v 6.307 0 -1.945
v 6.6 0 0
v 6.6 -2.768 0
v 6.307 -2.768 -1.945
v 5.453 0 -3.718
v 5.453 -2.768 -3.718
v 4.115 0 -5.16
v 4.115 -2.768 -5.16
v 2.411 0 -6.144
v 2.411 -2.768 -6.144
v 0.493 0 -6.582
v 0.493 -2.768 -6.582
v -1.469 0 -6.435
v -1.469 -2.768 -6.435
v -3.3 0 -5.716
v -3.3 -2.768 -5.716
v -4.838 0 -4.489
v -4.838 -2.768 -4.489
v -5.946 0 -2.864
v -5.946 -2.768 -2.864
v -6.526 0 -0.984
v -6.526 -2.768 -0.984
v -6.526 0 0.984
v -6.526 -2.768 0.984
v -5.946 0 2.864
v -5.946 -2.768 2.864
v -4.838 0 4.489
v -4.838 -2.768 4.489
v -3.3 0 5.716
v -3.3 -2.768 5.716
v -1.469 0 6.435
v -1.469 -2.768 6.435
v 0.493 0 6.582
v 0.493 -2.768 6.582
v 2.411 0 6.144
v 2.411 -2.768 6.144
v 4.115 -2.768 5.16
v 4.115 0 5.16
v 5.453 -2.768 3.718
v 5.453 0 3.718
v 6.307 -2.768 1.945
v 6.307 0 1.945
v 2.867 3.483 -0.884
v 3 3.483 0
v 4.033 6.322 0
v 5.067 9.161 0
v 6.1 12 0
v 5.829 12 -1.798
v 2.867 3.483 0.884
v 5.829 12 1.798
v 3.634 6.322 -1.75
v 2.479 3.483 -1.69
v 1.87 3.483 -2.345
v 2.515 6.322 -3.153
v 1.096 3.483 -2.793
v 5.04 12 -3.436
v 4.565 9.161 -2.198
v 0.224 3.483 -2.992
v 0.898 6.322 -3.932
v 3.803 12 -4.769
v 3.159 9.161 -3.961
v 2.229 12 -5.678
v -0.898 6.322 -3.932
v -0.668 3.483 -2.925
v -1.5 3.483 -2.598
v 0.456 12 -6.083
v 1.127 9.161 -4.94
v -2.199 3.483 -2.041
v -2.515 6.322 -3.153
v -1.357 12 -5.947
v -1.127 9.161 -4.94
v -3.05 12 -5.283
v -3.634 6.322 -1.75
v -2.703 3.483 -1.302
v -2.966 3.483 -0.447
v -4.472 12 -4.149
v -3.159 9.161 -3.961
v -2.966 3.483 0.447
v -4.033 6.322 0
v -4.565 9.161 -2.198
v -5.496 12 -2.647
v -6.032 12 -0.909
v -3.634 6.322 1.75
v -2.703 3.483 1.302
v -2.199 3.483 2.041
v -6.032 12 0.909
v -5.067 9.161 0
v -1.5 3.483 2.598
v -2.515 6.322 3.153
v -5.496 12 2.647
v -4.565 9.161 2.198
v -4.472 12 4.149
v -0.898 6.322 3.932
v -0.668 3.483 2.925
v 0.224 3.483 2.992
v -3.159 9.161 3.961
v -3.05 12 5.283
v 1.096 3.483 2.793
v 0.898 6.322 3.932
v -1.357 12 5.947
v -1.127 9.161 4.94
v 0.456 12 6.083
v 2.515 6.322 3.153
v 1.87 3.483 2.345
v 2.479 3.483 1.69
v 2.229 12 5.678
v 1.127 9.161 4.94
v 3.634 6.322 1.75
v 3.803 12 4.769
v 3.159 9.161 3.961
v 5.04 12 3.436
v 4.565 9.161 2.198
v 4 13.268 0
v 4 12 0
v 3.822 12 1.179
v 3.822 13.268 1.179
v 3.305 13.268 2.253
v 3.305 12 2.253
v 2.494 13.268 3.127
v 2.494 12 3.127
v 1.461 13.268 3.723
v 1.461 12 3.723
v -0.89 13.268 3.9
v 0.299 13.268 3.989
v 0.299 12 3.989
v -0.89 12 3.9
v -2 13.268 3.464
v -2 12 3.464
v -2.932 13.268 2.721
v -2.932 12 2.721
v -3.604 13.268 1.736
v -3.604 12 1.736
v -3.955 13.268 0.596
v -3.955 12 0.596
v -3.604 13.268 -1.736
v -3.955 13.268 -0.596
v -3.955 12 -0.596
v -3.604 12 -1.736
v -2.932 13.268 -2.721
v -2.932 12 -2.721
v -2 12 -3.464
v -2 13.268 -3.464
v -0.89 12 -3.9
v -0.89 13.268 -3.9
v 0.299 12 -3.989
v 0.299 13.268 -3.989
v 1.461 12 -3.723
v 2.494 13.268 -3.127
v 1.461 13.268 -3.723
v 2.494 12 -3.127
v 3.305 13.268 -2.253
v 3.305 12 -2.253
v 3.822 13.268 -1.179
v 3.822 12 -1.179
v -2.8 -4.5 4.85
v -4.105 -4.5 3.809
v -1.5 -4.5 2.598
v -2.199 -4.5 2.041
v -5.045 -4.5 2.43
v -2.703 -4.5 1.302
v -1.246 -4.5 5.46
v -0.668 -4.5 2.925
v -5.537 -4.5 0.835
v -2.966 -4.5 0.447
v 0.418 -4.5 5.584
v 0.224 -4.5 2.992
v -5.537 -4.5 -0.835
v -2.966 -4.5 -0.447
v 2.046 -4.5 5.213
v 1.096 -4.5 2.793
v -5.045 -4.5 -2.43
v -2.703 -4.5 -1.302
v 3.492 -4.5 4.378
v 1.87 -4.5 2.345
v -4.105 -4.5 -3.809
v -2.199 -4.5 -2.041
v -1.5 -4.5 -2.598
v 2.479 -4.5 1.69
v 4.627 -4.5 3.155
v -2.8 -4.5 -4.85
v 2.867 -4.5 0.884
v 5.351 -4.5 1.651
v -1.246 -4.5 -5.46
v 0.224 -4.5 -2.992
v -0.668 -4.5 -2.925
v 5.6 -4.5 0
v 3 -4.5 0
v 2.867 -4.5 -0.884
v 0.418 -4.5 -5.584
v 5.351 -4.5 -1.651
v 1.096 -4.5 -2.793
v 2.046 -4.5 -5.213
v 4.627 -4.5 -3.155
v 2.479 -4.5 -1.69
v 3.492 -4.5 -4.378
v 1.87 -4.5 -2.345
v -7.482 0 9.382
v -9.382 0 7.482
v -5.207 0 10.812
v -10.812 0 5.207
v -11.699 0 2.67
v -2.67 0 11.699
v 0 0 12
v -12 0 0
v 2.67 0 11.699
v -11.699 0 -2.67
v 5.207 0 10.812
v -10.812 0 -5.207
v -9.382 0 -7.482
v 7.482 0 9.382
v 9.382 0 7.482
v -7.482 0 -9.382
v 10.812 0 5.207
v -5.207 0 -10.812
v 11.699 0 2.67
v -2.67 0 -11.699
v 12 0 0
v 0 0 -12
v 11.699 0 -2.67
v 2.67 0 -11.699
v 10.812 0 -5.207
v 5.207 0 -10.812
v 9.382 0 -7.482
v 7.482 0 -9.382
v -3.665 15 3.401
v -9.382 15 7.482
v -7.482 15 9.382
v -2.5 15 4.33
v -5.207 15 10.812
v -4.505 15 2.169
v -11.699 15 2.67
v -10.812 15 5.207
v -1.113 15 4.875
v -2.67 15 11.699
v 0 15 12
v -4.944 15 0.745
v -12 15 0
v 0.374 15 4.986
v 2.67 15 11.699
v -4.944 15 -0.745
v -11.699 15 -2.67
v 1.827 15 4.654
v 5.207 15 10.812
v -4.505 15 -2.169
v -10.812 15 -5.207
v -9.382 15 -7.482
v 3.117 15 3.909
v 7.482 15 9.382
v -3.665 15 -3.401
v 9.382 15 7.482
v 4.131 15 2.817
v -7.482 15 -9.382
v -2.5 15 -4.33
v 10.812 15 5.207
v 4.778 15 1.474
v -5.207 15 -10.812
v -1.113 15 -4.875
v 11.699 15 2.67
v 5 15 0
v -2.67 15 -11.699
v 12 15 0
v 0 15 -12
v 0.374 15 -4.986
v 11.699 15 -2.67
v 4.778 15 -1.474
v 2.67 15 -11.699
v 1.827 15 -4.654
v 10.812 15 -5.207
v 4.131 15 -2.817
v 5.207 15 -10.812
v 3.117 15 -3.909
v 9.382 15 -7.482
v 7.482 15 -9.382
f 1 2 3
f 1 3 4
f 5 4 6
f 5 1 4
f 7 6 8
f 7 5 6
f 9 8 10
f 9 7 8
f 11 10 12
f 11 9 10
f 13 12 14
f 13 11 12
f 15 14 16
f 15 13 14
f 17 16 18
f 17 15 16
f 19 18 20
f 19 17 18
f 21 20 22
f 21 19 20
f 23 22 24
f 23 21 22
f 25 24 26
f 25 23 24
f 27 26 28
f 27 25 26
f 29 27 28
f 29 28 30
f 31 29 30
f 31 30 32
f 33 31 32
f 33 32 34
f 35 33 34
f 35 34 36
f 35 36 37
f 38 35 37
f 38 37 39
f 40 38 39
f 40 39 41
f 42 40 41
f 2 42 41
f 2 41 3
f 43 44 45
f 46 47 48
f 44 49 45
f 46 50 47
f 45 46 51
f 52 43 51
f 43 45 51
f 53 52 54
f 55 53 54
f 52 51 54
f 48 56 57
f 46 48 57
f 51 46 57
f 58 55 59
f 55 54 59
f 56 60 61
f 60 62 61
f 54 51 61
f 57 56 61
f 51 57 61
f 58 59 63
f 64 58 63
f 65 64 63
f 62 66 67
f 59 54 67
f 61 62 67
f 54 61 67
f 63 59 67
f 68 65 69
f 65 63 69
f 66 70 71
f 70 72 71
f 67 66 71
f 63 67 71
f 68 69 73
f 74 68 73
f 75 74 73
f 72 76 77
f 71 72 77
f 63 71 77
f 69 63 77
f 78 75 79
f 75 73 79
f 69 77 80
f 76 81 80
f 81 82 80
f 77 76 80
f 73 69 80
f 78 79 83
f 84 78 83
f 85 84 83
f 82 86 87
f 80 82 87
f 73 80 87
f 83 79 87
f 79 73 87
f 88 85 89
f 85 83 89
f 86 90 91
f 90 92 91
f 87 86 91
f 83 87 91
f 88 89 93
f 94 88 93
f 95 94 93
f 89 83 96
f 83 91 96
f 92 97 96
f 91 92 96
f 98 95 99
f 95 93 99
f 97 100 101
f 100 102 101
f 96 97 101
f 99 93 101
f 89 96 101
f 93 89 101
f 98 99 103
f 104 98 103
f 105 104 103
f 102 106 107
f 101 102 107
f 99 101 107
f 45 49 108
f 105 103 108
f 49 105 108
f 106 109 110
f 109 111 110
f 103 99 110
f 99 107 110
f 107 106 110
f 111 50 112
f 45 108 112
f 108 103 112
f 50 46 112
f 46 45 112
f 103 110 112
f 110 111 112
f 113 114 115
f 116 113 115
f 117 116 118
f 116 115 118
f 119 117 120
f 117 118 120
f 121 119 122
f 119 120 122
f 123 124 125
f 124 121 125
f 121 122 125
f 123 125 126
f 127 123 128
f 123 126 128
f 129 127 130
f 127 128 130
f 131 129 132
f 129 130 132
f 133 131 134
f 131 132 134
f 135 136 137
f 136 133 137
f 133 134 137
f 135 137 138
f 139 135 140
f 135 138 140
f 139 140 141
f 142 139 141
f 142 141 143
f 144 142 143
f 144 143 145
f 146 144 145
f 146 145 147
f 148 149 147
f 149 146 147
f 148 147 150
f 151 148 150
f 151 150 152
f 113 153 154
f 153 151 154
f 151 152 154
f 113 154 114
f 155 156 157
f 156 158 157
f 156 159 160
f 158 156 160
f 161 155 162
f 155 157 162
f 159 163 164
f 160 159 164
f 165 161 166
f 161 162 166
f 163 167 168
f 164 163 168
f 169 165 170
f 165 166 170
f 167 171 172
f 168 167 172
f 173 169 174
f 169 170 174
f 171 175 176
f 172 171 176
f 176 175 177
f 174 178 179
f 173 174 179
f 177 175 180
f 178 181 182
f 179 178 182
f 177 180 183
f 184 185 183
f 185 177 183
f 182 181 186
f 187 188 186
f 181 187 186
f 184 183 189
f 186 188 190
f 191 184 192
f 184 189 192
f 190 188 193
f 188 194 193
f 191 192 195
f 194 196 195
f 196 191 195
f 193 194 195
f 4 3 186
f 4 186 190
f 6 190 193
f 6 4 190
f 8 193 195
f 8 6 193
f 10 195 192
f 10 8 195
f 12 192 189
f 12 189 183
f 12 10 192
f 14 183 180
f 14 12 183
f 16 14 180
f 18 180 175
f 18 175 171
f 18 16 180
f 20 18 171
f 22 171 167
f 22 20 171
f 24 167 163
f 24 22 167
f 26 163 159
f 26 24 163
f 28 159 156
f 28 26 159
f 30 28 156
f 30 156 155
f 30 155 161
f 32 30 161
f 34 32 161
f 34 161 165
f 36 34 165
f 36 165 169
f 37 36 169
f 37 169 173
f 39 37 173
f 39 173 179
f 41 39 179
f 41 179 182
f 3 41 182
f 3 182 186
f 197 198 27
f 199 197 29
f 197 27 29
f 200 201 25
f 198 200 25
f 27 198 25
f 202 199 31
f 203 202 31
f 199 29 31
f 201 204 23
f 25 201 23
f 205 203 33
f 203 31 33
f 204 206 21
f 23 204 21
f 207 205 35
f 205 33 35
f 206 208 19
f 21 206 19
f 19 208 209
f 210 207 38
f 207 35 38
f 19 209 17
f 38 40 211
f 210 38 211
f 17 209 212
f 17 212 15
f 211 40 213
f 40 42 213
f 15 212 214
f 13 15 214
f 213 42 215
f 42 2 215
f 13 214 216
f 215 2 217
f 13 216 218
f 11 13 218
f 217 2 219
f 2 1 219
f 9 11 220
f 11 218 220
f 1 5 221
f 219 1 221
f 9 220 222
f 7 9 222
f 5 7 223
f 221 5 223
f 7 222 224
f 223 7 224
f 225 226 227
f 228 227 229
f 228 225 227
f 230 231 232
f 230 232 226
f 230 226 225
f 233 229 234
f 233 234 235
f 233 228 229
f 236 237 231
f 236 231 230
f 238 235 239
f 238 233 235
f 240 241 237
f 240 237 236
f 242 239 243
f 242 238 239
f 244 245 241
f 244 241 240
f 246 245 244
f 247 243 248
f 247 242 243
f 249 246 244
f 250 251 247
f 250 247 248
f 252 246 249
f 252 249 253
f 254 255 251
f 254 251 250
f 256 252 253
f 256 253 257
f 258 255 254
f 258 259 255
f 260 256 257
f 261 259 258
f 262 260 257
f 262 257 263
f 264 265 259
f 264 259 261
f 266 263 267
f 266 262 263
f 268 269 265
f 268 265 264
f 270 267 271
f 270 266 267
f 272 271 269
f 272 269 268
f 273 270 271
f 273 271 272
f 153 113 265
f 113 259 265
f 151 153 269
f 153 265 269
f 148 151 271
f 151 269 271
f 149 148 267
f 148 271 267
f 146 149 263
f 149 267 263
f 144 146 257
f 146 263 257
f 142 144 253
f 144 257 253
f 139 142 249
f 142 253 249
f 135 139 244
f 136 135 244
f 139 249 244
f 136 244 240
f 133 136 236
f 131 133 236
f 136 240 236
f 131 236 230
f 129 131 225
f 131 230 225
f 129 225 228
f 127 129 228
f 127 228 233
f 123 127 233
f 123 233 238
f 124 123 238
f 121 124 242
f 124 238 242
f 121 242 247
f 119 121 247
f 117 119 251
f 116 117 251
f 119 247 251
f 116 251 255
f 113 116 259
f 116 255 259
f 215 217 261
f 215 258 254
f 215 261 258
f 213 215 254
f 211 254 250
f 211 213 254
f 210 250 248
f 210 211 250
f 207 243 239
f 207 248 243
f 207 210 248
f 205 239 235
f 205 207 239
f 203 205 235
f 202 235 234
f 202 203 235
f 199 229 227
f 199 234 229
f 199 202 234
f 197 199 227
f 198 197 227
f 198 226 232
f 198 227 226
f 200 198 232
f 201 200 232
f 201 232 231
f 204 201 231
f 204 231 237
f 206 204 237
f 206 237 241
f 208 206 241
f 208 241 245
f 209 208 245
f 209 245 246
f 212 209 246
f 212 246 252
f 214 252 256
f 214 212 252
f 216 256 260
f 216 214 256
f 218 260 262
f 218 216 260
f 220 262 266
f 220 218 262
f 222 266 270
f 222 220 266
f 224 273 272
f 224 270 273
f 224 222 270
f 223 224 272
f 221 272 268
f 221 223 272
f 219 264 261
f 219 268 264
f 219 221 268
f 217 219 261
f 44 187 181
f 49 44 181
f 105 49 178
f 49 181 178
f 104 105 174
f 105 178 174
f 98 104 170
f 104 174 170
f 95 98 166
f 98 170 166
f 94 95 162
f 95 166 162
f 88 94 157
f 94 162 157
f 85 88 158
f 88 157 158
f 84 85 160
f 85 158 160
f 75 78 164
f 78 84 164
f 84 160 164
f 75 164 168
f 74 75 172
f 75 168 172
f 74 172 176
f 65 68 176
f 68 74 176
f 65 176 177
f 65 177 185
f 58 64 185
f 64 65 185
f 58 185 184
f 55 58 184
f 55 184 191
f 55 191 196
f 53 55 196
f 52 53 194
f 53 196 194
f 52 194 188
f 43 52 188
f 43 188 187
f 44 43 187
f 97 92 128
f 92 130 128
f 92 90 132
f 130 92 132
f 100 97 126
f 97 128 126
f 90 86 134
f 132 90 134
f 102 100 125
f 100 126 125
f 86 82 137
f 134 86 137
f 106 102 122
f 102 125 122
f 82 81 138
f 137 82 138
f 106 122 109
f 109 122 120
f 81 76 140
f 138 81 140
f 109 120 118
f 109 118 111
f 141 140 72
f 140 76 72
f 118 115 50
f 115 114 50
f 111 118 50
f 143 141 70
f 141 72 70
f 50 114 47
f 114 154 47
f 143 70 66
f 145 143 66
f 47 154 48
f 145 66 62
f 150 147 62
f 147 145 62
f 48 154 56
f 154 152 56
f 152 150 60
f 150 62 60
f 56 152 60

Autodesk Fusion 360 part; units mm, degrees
sketch "Sketch2" plane through (0, 0, 0) normal (0, 0, 1) x (1, 0, 0)
  line L0 (12, 15) -> (12, 0)
  line L1 (12, 0) -> (6.6, 0)
  line L2 (0, 0) -> (0, 15) construction
  line L3 (0, 15) -> (4, 15) construction
  line L4 (4, 15) -> (12, 15)
  line L5 (0, 0) -> (0, -4.5) construction
  line L6 (3, -4.5) -> (6.6, -4.5)
  line L7 (6.6, -4.5) -> (6.6, 0)
  line L8 (6.6, 0) -> (0, 0) construction
  line L9 (4, 15) -> (4, 12)
  line L10 (4, 12) -> (6.1, 12)
  line L11 (6.1, 12) -> (3, 3.4828)
  line L12 (3, 3.4828) -> (3, -4.5)
  line L13 (0, -4.5) -> (3, -4.5) construction
  dimension "d15" = 12
  dimension "d17" = 15
  dimension "d18" = 6.6
  dimension "d19" = 4
  dimension "d20" = 3
  dimension "d21" = 6.1
  dimension "d22" = 70
  dimension "d23" = 3
  dimension "d24" = 4.5
revolve "Revolve1" add sketch "Sketch2" angle 360 about axis through (0, 0, 0) along (0, 1, 0)
chamfer "Chamfer1" distance 1 angle 60 2 edges at (-3.7293, 15, -1.4465) (-6.1534, -4.5, -2.3867) measured on face at (9.2887, 15, 0.5962) measured on face at (5.3754, -4.5, 0.3279)
